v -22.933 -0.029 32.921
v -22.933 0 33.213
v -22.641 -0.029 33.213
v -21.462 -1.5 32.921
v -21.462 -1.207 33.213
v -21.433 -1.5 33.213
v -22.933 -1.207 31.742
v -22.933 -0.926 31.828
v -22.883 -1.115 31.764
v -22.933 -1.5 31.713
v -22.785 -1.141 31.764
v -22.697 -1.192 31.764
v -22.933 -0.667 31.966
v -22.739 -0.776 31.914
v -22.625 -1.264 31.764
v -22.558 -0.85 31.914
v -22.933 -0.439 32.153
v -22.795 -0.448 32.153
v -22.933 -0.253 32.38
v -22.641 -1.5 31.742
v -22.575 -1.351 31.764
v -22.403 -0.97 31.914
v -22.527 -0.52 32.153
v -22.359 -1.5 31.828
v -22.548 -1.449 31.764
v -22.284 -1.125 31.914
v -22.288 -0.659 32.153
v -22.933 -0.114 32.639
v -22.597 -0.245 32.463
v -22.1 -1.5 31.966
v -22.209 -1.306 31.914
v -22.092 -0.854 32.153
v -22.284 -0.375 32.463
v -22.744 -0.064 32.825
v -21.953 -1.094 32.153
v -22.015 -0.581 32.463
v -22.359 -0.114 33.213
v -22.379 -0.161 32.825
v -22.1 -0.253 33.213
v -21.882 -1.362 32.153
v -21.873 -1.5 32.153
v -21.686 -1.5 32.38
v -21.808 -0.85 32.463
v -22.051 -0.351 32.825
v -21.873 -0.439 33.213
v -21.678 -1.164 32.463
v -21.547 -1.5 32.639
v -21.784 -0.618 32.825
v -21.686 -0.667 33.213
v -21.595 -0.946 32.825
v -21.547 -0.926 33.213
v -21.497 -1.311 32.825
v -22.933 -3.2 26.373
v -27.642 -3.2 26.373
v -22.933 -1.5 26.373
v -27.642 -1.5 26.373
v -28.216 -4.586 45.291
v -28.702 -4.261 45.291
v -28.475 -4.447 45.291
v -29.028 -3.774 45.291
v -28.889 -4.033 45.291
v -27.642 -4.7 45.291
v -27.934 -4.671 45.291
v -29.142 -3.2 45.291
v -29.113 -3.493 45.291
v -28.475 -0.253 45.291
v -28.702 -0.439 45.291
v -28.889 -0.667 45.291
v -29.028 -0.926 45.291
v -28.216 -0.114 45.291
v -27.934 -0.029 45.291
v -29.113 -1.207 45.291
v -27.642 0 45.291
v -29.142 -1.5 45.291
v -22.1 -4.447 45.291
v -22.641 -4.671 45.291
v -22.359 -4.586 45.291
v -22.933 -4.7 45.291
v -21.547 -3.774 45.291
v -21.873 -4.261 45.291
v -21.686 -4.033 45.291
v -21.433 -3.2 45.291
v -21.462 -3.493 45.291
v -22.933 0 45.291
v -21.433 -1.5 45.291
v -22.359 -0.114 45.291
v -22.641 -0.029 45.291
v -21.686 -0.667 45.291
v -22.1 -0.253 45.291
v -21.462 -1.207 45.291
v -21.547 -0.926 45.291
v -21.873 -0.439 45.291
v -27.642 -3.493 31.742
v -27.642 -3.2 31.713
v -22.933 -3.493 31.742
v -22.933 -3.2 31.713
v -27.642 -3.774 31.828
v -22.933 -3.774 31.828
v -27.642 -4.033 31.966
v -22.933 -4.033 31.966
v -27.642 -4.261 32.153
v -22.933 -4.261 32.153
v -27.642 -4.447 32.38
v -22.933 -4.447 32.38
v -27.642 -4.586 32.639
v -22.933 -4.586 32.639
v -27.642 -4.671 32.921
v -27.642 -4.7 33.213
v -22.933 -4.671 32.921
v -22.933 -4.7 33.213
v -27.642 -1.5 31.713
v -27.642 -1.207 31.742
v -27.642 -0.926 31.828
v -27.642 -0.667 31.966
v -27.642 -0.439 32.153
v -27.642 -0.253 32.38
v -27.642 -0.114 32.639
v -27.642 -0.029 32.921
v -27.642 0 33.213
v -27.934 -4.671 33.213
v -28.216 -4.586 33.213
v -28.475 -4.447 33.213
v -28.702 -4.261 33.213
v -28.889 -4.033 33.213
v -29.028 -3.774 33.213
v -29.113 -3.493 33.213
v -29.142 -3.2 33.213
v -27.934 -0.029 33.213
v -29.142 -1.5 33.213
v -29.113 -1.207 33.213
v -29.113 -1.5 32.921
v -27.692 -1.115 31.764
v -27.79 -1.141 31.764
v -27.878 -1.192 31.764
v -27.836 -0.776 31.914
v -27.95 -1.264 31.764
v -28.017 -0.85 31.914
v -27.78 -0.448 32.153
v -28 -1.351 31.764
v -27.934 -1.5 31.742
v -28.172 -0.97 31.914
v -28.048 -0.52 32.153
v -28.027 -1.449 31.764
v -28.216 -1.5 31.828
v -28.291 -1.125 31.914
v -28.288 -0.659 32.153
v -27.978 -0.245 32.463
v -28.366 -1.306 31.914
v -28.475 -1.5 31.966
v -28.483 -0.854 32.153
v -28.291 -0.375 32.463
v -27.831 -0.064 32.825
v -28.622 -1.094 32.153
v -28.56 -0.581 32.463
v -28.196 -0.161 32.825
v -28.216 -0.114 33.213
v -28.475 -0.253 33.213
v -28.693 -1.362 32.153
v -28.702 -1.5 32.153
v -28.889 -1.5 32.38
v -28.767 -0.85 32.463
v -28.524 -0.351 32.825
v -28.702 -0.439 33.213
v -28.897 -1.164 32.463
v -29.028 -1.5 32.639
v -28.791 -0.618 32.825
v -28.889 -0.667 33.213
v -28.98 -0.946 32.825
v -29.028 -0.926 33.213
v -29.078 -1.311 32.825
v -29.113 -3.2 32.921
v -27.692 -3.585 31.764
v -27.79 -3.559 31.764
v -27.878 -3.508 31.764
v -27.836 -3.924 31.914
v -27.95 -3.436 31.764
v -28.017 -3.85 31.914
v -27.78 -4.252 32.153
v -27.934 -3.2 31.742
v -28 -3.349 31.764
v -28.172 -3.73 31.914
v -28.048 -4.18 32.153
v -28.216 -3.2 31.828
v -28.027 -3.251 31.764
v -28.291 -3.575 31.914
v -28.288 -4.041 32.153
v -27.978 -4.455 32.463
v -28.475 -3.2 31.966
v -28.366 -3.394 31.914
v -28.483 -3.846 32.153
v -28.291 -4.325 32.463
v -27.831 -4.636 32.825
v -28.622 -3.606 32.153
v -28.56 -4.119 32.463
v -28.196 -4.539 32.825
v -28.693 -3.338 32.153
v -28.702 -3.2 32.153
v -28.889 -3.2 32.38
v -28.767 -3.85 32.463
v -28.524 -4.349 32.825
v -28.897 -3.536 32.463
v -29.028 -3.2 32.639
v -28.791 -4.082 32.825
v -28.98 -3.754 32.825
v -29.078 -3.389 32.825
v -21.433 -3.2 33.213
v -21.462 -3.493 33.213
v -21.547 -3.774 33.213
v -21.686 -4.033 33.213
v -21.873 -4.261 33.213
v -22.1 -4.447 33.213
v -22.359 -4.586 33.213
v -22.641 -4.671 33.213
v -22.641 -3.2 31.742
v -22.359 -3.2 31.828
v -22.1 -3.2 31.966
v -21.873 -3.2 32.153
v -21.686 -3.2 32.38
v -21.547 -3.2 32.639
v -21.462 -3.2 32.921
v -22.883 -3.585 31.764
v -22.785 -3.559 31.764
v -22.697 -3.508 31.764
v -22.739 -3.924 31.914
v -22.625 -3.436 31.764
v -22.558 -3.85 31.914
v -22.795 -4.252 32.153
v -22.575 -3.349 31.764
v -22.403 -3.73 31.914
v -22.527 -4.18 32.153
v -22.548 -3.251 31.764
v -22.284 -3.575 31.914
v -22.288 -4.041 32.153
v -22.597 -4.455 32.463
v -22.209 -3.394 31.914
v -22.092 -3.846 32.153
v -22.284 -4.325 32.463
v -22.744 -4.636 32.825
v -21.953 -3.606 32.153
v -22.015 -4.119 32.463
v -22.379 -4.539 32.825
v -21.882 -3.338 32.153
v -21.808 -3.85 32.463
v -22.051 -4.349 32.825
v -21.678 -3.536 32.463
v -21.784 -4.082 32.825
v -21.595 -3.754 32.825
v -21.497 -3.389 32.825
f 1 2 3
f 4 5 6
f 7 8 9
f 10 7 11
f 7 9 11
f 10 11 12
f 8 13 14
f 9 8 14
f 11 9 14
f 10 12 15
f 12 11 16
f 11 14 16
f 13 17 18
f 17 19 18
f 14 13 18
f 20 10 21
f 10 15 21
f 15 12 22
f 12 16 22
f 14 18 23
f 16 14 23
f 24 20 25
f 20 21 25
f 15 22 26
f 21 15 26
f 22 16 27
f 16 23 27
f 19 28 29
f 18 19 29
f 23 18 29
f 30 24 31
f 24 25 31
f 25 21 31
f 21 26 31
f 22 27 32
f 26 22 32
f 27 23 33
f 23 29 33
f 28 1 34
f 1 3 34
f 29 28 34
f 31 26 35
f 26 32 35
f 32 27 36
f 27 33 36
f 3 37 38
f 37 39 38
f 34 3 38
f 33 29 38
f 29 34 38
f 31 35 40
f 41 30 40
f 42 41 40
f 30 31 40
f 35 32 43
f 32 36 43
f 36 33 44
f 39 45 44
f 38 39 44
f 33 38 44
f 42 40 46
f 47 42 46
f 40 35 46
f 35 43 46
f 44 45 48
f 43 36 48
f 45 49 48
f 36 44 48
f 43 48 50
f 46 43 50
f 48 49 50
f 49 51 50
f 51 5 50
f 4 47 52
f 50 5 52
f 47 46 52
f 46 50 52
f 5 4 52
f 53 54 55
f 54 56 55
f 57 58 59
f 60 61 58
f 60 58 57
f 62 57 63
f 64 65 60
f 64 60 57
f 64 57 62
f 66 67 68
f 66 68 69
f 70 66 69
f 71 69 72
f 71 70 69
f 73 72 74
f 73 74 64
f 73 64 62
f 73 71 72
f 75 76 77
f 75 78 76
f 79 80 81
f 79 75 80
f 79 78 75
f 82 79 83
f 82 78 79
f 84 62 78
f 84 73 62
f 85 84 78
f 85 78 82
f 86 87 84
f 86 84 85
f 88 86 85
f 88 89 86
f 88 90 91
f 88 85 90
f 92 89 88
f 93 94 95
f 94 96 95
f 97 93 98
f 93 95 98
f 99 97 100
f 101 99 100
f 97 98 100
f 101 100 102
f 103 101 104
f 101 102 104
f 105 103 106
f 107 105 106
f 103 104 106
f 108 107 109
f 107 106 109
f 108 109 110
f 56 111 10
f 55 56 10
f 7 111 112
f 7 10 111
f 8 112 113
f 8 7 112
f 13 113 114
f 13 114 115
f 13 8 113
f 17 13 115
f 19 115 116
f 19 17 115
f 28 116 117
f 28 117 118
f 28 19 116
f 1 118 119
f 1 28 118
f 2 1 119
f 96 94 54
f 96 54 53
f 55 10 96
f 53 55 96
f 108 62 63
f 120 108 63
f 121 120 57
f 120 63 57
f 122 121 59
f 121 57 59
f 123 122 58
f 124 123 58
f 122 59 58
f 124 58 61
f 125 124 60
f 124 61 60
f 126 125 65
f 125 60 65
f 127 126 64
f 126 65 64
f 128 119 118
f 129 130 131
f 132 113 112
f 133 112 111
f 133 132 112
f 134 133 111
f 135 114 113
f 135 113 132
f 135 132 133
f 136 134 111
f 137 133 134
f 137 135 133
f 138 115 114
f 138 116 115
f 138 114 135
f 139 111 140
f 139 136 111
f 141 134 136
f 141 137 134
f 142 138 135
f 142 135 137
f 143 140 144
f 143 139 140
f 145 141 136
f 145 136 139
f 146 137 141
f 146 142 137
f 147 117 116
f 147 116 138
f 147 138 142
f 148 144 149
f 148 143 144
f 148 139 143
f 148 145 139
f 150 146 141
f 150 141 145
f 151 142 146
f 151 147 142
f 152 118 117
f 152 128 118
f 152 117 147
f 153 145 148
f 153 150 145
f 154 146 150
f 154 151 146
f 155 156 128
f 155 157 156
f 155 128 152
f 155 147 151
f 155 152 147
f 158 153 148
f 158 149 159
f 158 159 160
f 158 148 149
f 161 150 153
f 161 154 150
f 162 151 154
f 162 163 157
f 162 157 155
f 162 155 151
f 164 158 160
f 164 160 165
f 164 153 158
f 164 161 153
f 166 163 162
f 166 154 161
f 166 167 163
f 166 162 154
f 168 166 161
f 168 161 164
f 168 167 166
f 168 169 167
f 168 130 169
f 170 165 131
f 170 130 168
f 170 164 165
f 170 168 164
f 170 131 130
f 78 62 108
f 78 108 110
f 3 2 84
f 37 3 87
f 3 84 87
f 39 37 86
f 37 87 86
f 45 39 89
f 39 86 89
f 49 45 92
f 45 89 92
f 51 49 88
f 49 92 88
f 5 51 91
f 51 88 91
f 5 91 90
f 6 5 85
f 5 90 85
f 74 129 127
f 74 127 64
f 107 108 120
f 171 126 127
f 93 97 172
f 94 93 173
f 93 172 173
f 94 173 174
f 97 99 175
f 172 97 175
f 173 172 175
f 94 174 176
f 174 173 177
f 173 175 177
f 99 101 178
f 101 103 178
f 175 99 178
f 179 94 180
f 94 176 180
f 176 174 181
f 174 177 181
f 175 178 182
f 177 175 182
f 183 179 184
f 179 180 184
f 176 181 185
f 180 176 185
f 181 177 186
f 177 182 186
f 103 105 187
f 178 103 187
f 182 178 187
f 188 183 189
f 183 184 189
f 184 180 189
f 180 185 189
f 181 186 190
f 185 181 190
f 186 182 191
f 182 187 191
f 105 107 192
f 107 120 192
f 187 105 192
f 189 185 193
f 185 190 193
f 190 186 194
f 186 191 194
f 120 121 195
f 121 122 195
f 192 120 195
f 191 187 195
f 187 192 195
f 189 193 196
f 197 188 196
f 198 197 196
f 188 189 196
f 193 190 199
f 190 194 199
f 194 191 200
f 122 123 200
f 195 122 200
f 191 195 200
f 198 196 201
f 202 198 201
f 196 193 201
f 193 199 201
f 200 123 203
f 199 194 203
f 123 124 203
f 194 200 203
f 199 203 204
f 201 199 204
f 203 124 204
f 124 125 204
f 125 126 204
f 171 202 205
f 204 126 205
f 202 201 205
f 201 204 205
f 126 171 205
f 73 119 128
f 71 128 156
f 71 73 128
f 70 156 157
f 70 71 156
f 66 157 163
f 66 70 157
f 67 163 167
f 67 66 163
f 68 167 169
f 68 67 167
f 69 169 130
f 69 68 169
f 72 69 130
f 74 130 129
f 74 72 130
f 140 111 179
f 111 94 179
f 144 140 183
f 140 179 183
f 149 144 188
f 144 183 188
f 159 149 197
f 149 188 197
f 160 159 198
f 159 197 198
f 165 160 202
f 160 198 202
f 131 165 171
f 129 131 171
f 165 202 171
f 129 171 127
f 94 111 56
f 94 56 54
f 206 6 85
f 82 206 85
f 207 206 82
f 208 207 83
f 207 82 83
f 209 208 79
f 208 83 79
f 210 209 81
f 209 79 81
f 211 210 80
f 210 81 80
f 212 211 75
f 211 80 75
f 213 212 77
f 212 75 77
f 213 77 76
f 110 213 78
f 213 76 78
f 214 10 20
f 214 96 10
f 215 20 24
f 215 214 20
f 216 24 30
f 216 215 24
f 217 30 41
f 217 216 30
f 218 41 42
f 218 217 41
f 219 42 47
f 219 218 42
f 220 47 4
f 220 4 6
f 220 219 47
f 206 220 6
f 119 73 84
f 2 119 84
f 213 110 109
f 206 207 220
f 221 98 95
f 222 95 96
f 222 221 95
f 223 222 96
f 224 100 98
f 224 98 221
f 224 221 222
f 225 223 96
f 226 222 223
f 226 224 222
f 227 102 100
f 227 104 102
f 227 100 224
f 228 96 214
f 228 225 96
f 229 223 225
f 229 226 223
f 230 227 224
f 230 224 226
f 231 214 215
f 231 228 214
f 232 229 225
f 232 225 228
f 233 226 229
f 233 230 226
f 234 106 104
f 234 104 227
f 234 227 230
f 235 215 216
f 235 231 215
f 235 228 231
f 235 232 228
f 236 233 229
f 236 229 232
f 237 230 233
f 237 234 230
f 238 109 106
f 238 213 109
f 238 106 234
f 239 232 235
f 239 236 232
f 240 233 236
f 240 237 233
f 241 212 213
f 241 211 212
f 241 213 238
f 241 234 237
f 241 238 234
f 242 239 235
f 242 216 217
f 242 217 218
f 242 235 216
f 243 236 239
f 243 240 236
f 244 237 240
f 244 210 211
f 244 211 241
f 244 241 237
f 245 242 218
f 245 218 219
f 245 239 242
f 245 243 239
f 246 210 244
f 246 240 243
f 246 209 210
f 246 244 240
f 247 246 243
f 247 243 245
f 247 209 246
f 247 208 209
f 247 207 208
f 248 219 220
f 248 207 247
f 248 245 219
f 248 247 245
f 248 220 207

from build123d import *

# Parameters (mm, degrees)
F0_W     = 7.7586211264
F0_H     = 13.5775841773
F1_DEPTH = 4.7
F2_DEPTH = 0.05
F3_R     = 1.5
F4_DEPTH = 5.34


with BuildPart() as f1:
    # F0 (on Front) → F1 (new body)
    with BuildSketch(Plane.XZ):
        with Locations((-25.3125019372, 38.5021548718)):
            Rectangle(F0_W, F0_H)
    extrude(amount=F1_DEPTH)

    # F2 (cut): a face of the model
    f2_faces = [f1.faces().sort_by_distance(p)[0] for p in [
        (-29.1918125004, -2.35, 38.5021548718),
    ]]
    extrude(f2_faces, amount=-F2_DEPTH, mode=Mode.SUBTRACT)

    # F3
    f3_edges = [f1.edges().sort_by_distance(p)[0] for p in [
        (-29.141813, -4.7, 38.502155),
        (-29.141813, 0, 38.502155),
        (-21.433191, 0, 38.502155),
        (-21.433191, -4.7, 38.502155),
        (-25.287502, -4.7, 31.713363),
        (-25.287502, 0, 31.713363),
        (-21.433191, -2.35, 31.713363),
        (-29.141813, -2.35, 31.713363),
    ]]
    fillet(f3_edges, radius=F3_R)

    # F4 (add): a face of the model
    f4_faces = [f1.faces().sort_by_distance(p)[0] for p in [
        (-25.2875019372, -2.35, 31.7133627832),
    ]]
    extrude(f4_faces, amount=F4_DEPTH)


solid = f1.part
